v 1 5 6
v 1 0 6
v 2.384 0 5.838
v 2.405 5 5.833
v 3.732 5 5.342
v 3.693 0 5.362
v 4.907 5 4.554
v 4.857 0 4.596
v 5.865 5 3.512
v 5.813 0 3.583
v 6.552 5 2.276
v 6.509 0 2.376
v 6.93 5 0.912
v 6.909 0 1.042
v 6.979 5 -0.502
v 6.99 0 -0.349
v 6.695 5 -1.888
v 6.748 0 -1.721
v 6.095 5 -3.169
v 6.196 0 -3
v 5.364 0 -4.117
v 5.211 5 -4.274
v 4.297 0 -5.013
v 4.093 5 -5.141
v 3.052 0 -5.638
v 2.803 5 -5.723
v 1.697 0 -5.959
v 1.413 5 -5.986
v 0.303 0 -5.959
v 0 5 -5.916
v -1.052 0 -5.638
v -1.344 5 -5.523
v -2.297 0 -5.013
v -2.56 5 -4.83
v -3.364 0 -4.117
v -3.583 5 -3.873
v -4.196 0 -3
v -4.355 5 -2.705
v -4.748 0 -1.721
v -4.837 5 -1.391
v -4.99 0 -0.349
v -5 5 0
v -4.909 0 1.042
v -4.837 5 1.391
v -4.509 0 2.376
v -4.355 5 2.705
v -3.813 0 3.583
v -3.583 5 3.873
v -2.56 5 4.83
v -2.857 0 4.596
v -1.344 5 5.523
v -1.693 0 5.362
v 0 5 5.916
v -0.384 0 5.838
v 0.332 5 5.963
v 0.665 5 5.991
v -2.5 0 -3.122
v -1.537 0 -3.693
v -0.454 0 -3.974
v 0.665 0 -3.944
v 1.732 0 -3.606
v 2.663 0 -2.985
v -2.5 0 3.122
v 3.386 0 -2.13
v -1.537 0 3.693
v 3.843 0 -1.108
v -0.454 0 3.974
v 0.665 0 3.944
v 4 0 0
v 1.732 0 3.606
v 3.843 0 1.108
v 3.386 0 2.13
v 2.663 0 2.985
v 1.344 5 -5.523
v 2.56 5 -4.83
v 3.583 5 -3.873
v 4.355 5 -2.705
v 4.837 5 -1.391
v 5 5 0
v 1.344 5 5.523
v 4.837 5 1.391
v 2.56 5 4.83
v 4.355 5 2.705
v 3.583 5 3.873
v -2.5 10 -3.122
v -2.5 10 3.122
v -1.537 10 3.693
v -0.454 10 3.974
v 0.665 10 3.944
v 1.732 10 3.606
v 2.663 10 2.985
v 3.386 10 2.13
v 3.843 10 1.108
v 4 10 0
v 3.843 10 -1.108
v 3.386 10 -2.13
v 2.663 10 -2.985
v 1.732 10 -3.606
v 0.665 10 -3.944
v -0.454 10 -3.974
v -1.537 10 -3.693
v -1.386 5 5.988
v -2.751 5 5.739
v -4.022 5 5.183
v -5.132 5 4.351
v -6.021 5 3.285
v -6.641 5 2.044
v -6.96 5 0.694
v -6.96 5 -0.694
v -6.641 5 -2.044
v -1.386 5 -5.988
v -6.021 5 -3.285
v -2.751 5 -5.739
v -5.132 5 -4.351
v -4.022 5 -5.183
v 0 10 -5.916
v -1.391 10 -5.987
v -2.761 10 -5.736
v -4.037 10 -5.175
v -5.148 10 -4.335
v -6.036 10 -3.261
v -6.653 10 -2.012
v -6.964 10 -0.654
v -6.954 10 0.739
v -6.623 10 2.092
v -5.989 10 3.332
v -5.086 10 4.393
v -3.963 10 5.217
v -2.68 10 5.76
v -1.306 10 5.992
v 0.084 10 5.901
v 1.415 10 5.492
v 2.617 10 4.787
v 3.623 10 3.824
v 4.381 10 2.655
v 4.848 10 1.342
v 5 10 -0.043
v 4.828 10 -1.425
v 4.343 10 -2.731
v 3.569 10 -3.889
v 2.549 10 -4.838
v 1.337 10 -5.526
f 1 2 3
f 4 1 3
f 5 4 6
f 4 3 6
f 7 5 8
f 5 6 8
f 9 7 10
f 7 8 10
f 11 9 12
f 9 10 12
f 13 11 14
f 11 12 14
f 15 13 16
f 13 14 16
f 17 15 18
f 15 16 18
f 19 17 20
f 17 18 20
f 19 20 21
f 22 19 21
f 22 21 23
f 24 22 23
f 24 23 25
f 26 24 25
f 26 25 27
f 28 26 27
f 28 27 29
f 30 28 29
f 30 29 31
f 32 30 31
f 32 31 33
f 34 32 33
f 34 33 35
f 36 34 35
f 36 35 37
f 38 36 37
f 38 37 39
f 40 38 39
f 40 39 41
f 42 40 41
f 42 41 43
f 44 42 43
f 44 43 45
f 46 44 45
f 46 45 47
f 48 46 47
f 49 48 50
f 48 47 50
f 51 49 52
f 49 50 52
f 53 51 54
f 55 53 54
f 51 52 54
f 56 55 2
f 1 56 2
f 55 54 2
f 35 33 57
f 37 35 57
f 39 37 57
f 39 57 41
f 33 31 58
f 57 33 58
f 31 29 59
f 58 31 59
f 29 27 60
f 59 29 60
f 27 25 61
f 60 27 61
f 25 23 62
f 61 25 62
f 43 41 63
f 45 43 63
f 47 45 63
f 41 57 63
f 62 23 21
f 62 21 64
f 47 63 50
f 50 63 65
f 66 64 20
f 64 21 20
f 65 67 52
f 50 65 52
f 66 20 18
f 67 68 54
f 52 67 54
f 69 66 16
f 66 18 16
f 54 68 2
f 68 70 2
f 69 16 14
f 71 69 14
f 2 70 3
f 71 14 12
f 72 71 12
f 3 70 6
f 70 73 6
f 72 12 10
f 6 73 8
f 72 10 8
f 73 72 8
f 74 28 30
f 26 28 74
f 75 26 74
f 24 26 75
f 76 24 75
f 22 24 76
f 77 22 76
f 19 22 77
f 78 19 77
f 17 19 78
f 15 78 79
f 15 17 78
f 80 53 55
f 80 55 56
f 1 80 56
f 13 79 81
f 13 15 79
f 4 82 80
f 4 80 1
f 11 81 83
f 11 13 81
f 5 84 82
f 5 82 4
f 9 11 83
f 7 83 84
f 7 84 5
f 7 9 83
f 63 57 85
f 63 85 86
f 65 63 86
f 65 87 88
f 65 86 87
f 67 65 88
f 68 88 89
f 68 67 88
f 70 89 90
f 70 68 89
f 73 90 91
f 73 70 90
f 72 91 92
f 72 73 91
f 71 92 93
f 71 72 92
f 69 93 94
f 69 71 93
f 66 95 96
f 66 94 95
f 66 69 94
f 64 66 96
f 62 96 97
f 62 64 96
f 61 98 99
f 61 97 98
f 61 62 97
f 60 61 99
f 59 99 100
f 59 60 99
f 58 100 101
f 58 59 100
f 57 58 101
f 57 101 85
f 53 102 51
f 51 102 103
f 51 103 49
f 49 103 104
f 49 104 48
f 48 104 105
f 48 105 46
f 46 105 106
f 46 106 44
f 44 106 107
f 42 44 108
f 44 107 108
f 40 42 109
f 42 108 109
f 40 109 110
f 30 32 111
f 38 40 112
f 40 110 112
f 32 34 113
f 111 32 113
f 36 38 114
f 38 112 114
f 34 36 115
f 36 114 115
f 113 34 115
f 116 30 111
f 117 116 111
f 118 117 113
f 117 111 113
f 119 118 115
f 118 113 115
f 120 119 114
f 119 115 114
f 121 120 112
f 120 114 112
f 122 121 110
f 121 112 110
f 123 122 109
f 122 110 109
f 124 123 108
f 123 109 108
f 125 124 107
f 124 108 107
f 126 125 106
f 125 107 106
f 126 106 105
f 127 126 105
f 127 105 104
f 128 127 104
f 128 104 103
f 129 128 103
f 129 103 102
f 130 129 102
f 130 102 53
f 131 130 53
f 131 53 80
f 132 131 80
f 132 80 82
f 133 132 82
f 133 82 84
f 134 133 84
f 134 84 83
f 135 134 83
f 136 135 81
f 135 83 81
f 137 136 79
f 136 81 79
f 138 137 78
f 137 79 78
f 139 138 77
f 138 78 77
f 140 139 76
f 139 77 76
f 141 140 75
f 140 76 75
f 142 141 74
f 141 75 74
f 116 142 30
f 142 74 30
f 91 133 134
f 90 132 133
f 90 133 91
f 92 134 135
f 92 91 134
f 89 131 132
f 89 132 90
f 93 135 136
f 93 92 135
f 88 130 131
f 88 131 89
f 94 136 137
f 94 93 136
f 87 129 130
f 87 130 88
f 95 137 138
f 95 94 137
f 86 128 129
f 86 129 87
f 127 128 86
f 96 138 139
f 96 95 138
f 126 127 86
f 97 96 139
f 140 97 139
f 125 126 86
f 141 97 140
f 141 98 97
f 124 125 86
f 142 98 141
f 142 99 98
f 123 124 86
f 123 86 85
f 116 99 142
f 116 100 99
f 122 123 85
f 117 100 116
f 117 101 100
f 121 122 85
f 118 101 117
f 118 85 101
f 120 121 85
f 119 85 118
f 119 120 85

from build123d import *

# Parameters (mm, degrees)
SKETCH1_R           = 6
SKETCH1_R_2         = 4
BOSS_EXTRUDE1_DEPTH = 5
SKETCH2_R           = 6
SKETCH2_R_2         = 4
BOSS_EXTRUDE2_DEPTH = 5
BOSS_EXTRUDE3_DEPTH = 10


with BuildPart() as part:
    # Sketch1 → Boss-Extrude1 (new body)
    with BuildSketch(Plane(origin=(0, 0, 0), x_dir=(1, 0, 0), z_dir=(0, 1, 0))):
        with Locations(Location((1, 0, 0), (0, 0, 270))):
            Circle(SKETCH1_R)
        with Locations(Location((0, 0, 0), (0, 0, 270))):
            Circle(SKETCH1_R_2, mode=Mode.SUBTRACT)
    extrude(amount=BOSS_EXTRUDE1_DEPTH)

    # Sketch2 → Boss-Extrude2 (add)
    with BuildSketch(Plane(origin=(0, 5, 0), x_dir=(1, 0, 0), z_dir=(0, 1, 0))):
        with Locations(Location((-1, 0, 0), (0, 0, 80.405931773))):
            Circle(SKETCH2_R)
        with Locations(Location((0, 0, 0), (0, 0, 270))):
            Circle(SKETCH2_R_2, mode=Mode.SUBTRACT)
    extrude(amount=BOSS_EXTRUDE2_DEPTH)

    # Sketch3 → Boss-Extrude3 (add)
    with BuildSketch(Plane(origin=(0, 0, 0), x_dir=(1, 0, 0), z_dir=(0, 1, 0))):
        with BuildLine():
            Line((-2.5, 3.122498999), (-2.5, -3.122498999))
            ThreePointArc((-2.5, -3.122498999), (-4, 0), (-2.5, 3.122498999))
        make_face()
    extrude(amount=BOSS_EXTRUDE3_DEPTH)


solid = part.part
